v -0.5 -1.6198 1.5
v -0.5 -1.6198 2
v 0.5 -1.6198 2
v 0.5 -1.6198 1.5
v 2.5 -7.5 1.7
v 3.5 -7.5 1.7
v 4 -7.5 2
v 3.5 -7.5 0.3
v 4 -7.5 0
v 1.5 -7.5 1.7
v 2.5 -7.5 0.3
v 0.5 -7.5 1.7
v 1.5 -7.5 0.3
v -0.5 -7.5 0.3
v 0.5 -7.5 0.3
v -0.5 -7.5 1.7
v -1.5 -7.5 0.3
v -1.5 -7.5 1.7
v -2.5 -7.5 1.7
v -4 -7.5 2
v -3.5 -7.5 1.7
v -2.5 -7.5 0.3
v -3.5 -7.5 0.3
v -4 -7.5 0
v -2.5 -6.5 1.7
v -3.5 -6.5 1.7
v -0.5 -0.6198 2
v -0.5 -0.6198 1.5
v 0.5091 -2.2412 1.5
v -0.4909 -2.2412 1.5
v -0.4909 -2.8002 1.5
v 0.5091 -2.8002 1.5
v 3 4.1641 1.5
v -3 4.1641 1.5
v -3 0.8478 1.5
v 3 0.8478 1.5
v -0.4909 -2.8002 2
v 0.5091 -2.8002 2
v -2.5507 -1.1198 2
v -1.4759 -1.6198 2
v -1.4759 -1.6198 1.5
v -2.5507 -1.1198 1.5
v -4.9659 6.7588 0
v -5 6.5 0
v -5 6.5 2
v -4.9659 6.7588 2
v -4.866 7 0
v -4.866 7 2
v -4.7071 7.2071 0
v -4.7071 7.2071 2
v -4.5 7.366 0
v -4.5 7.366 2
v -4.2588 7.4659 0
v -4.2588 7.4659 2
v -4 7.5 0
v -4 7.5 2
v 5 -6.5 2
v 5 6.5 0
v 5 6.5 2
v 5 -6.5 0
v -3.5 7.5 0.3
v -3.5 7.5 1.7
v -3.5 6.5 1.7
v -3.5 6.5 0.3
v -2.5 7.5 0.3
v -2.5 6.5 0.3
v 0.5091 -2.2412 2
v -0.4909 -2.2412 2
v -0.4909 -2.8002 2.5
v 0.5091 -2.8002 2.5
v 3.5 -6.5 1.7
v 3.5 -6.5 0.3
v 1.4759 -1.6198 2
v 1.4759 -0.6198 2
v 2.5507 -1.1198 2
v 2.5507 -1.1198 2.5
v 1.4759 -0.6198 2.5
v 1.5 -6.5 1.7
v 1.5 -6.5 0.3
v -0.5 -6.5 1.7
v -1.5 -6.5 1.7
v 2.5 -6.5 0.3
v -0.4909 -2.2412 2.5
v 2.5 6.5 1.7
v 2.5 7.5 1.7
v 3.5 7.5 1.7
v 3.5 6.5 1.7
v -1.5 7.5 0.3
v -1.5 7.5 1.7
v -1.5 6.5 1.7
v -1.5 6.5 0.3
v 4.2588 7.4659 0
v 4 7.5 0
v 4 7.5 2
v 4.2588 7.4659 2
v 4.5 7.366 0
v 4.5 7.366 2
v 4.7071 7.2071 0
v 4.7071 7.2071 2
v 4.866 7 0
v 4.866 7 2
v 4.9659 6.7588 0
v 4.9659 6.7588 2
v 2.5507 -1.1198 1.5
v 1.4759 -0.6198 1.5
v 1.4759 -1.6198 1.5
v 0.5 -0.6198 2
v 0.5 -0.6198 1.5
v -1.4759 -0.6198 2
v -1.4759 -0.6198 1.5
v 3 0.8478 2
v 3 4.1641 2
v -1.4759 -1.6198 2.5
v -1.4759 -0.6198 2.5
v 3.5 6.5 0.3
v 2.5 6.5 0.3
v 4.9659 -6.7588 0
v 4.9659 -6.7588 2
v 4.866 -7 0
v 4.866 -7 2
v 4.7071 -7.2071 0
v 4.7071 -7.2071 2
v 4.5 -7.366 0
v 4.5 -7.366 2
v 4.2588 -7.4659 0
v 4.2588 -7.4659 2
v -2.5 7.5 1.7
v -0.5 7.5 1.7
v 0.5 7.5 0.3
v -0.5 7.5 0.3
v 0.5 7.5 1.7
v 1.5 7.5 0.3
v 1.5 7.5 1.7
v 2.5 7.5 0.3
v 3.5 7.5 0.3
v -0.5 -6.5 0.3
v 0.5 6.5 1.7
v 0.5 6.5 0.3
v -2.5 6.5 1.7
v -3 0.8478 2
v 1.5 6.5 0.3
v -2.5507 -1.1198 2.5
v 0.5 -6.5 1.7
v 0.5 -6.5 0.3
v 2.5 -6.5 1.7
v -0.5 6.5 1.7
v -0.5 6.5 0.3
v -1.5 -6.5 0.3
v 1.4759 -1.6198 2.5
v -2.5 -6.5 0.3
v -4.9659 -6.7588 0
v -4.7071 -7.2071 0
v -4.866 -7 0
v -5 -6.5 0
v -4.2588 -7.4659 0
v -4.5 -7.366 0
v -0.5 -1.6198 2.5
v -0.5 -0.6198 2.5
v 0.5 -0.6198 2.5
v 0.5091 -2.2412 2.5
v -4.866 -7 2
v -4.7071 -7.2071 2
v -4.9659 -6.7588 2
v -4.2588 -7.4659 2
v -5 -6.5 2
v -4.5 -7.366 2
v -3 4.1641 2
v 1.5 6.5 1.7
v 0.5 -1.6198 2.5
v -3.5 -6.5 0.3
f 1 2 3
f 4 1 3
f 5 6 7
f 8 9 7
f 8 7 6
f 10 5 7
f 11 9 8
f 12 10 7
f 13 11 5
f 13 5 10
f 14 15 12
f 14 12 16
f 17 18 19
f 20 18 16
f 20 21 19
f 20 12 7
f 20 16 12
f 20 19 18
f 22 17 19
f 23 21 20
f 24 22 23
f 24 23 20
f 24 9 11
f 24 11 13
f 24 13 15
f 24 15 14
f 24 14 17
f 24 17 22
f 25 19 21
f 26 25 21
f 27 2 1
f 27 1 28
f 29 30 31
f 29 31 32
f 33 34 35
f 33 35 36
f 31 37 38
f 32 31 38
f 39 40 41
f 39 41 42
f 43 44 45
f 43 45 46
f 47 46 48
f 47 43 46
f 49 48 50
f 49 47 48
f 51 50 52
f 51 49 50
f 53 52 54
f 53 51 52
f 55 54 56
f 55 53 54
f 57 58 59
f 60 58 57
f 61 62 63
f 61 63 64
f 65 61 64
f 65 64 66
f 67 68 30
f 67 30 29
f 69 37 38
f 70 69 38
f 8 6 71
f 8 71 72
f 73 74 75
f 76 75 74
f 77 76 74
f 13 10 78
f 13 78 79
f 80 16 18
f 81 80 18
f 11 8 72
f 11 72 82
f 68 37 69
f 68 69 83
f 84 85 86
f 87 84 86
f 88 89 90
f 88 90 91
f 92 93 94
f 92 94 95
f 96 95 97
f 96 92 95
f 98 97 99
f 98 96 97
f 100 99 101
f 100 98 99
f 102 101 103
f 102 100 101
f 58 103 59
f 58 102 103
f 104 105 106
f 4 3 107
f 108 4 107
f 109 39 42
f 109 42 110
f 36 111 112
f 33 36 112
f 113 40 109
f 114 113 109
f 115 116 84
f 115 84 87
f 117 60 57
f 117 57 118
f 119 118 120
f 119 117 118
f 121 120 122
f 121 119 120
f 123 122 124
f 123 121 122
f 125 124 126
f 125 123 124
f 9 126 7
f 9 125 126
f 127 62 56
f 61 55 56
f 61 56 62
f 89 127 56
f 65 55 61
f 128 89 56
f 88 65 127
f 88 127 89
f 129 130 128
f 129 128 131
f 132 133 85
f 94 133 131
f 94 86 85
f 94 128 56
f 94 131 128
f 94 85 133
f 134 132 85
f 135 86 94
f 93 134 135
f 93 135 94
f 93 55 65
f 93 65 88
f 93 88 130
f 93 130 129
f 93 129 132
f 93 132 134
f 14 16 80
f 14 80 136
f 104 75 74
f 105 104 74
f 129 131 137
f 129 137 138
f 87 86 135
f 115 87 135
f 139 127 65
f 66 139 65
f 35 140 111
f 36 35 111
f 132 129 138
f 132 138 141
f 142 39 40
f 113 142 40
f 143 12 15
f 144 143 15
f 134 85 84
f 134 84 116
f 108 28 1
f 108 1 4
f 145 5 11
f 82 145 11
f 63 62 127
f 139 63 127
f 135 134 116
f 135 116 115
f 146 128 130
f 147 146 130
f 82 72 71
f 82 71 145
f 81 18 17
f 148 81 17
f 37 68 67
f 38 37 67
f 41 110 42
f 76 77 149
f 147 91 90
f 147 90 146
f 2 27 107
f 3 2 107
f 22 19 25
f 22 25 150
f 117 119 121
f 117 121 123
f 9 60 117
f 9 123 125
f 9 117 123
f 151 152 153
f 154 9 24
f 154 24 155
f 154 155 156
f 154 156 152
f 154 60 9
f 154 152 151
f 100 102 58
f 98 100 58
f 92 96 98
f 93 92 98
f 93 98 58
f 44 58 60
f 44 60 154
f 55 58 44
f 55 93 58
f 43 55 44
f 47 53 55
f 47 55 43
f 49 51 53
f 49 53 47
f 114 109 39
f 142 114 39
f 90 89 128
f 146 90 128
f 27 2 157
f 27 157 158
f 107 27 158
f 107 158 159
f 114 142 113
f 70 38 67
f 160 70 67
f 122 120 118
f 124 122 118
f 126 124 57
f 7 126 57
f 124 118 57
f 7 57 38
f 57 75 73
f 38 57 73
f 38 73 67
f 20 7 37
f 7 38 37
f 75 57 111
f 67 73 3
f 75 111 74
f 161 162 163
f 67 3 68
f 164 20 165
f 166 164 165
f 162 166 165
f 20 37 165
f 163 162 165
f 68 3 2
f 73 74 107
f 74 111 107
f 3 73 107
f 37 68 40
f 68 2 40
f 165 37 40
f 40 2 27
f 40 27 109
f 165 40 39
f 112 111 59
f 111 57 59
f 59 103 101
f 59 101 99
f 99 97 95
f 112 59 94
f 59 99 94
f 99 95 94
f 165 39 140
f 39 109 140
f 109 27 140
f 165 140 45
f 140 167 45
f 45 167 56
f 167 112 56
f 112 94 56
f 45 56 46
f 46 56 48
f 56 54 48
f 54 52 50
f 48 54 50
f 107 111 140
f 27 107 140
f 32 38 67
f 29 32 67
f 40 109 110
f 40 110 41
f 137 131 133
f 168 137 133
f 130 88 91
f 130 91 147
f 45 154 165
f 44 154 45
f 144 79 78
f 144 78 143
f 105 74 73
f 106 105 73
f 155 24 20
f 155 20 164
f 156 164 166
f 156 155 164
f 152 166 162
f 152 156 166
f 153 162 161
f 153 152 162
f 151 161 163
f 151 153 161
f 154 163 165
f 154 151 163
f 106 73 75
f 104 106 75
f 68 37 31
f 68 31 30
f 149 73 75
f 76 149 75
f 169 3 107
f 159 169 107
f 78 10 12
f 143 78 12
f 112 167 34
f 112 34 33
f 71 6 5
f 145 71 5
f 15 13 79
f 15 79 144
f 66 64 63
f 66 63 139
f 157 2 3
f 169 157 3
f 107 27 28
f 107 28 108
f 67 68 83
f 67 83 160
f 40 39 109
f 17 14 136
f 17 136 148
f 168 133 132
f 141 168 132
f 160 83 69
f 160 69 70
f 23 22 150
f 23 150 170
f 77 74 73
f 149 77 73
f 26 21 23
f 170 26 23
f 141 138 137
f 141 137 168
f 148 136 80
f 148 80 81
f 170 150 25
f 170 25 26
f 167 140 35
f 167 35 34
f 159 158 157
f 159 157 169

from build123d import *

# Parameters (mm, degrees)
BOSS_EXTRUDE1_DEPTH   = 2
SKETCH3_W             = 1
SKETCH3_H             = 1.4
CUT_EXTRUDE2_DEPTH    = 1
SKETCH2_W             = 1
SKETCH2_H             = 1.4
CUT_EXTRUDE3_DEPTH    = 1
SKETCH4_W             = 6
SKETCH4_H             = 3.316332314
SKETCH4_W_2           = 1
SKETCH4_H_2           = 1
SKETCH4_H_3           = 0.559018778
CUT_EXTRUDE4_DEPTH    = 0.5
BOSS_EXTRUDE2_DEPTH   = 0.5
SKETCH5_W             = 1
SKETCH5_H             = 1
BOSS_EXTRUDE2_2_DEPTH = 0.5
SKETCH5_H_2           = 0.559018778
BOSS_EXTRUDE2_3_DEPTH = 0.5
BOSS_EXTRUDE2_4_DEPTH = 0.5


with BuildPart() as part:
    # Sketch1 → Boss-Extrude1 (new body)
    with BuildSketch(Plane.XY):
        with BuildLine():
            Line((-4, 7.5), (4, 7.5))
            ThreePointArc((4, 7.5), (4.707106781, 7.207106781), (5, 6.5))
            Line((5, 6.5), (5, -6.5))
            ThreePointArc((5, -6.5), (4.707106781, -7.207106781), (4, -7.5))
            Line((4, -7.5), (-4, -7.5))
            ThreePointArc((-4, -7.5), (-4.707106781, -7.207106781), (-5, -6.5))
            Line((-5, -6.5), (-5, 6.5))
            ThreePointArc((-5, 6.5), (-4.707106781, 7.207106781), (-4, 7.5))
        make_face()
    extrude(amount=BOSS_EXTRUDE1_DEPTH)

    # Sketch3 → Cut-Extrude2 (cut)
    with BuildSketch(Plane(origin=(0, -7.5, 0), x_dir=(-1, 0, 0), z_dir=(0, -1, 0))):
        with Locations((-3, -1)):
            Rectangle(SKETCH3_W, SKETCH3_H)
        with Locations((-1, -1)):
            Rectangle(SKETCH3_W, SKETCH3_H)
        with Locations((1, -1)):
            Rectangle(SKETCH3_W, SKETCH3_H)
        with Locations((3, -1)):
            Rectangle(SKETCH3_W, SKETCH3_H)
    extrude(amount=-CUT_EXTRUDE2_DEPTH, mode=Mode.SUBTRACT)

    # Sketch2 → Cut-Extrude3 (cut)
    with BuildSketch(Plane(origin=(0, 7.5, 0), x_dir=(1, 0, 0), z_dir=(0, 1, 0))):
        with Locations((-1, -1)):
            Rectangle(SKETCH2_W, SKETCH2_H)
        with Locations((1, -1)):
            Rectangle(SKETCH2_W, SKETCH2_H)
        with Locations((3, -1)):
            Rectangle(SKETCH2_W, SKETCH2_H)
        with Locations((-3, -1)):
            Rectangle(SKETCH2_W, SKETCH2_H)
    extrude(amount=-CUT_EXTRUDE3_DEPTH, mode=Mode.SUBTRACT)

    # Sketch4 → Cut-Extrude4 (cut)
    with BuildSketch(Plane.XY.offset(2)):
        with Locations((0, 2.505950357)):
            Rectangle(SKETCH4_W, SKETCH4_H)
        Polygon((1.475933968, -0.619829312), (1.475933968, -1.619829312), (2.550668767, -1.119829312), align=None)
        with Locations((0, -1.119829312)):
            Rectangle(SKETCH4_W_2, SKETCH4_H_2)
        with Locations((0.009064429, -2.520688379)):
            Rectangle(SKETCH4_W_2, SKETCH4_H_3)
        Polygon((-1.475933968, -0.619829312), (-1.475933968, -1.619829312), (-2.550668767, -1.119829312), align=None)
    extrude(amount=-CUT_EXTRUDE4_DEPTH, mode=Mode.SUBTRACT)


with BuildPart() as body_2:
    # Sketch5 → Boss-Extrude2 (new body)
    with BuildSketch(Plane.XY.offset(2)):
        Polygon((1.475933968, -0.619829312), (1.475933968, -1.619829312), (2.550668767, -1.119829312), align=None)
    extrude(amount=BOSS_EXTRUDE2_DEPTH)


with BuildPart() as body_3:
    # Sketch5 → Boss-Extrude2 2 (new body)
    with BuildSketch(Plane.XY.offset(2)):
        with Locations((0, -1.119829312)):
            Rectangle(SKETCH5_W, SKETCH5_H)
    extrude(amount=BOSS_EXTRUDE2_2_DEPTH)


with BuildPart() as body_4:
    # Sketch5 → Boss-Extrude2 3 (new body)
    with BuildSketch(Plane.XY.offset(2)):
        with Locations((0.009064429, -2.520688379)):
            Rectangle(SKETCH5_W, SKETCH5_H_2)
    extrude(amount=BOSS_EXTRUDE2_3_DEPTH)


with BuildPart() as body_5:
    # Sketch5 → Boss-Extrude2 4 (new body)
    with BuildSketch(Plane.XY.offset(2)):
        Polygon((-1.475933968, -1.619829312), (-1.475933968, -0.619829312), (-2.550668767, -1.119829312), align=None)
    extrude(amount=BOSS_EXTRUDE2_4_DEPTH)


solid = Compound([part.part, body_2.part, body_3.part, body_4.part, body_5.part])
